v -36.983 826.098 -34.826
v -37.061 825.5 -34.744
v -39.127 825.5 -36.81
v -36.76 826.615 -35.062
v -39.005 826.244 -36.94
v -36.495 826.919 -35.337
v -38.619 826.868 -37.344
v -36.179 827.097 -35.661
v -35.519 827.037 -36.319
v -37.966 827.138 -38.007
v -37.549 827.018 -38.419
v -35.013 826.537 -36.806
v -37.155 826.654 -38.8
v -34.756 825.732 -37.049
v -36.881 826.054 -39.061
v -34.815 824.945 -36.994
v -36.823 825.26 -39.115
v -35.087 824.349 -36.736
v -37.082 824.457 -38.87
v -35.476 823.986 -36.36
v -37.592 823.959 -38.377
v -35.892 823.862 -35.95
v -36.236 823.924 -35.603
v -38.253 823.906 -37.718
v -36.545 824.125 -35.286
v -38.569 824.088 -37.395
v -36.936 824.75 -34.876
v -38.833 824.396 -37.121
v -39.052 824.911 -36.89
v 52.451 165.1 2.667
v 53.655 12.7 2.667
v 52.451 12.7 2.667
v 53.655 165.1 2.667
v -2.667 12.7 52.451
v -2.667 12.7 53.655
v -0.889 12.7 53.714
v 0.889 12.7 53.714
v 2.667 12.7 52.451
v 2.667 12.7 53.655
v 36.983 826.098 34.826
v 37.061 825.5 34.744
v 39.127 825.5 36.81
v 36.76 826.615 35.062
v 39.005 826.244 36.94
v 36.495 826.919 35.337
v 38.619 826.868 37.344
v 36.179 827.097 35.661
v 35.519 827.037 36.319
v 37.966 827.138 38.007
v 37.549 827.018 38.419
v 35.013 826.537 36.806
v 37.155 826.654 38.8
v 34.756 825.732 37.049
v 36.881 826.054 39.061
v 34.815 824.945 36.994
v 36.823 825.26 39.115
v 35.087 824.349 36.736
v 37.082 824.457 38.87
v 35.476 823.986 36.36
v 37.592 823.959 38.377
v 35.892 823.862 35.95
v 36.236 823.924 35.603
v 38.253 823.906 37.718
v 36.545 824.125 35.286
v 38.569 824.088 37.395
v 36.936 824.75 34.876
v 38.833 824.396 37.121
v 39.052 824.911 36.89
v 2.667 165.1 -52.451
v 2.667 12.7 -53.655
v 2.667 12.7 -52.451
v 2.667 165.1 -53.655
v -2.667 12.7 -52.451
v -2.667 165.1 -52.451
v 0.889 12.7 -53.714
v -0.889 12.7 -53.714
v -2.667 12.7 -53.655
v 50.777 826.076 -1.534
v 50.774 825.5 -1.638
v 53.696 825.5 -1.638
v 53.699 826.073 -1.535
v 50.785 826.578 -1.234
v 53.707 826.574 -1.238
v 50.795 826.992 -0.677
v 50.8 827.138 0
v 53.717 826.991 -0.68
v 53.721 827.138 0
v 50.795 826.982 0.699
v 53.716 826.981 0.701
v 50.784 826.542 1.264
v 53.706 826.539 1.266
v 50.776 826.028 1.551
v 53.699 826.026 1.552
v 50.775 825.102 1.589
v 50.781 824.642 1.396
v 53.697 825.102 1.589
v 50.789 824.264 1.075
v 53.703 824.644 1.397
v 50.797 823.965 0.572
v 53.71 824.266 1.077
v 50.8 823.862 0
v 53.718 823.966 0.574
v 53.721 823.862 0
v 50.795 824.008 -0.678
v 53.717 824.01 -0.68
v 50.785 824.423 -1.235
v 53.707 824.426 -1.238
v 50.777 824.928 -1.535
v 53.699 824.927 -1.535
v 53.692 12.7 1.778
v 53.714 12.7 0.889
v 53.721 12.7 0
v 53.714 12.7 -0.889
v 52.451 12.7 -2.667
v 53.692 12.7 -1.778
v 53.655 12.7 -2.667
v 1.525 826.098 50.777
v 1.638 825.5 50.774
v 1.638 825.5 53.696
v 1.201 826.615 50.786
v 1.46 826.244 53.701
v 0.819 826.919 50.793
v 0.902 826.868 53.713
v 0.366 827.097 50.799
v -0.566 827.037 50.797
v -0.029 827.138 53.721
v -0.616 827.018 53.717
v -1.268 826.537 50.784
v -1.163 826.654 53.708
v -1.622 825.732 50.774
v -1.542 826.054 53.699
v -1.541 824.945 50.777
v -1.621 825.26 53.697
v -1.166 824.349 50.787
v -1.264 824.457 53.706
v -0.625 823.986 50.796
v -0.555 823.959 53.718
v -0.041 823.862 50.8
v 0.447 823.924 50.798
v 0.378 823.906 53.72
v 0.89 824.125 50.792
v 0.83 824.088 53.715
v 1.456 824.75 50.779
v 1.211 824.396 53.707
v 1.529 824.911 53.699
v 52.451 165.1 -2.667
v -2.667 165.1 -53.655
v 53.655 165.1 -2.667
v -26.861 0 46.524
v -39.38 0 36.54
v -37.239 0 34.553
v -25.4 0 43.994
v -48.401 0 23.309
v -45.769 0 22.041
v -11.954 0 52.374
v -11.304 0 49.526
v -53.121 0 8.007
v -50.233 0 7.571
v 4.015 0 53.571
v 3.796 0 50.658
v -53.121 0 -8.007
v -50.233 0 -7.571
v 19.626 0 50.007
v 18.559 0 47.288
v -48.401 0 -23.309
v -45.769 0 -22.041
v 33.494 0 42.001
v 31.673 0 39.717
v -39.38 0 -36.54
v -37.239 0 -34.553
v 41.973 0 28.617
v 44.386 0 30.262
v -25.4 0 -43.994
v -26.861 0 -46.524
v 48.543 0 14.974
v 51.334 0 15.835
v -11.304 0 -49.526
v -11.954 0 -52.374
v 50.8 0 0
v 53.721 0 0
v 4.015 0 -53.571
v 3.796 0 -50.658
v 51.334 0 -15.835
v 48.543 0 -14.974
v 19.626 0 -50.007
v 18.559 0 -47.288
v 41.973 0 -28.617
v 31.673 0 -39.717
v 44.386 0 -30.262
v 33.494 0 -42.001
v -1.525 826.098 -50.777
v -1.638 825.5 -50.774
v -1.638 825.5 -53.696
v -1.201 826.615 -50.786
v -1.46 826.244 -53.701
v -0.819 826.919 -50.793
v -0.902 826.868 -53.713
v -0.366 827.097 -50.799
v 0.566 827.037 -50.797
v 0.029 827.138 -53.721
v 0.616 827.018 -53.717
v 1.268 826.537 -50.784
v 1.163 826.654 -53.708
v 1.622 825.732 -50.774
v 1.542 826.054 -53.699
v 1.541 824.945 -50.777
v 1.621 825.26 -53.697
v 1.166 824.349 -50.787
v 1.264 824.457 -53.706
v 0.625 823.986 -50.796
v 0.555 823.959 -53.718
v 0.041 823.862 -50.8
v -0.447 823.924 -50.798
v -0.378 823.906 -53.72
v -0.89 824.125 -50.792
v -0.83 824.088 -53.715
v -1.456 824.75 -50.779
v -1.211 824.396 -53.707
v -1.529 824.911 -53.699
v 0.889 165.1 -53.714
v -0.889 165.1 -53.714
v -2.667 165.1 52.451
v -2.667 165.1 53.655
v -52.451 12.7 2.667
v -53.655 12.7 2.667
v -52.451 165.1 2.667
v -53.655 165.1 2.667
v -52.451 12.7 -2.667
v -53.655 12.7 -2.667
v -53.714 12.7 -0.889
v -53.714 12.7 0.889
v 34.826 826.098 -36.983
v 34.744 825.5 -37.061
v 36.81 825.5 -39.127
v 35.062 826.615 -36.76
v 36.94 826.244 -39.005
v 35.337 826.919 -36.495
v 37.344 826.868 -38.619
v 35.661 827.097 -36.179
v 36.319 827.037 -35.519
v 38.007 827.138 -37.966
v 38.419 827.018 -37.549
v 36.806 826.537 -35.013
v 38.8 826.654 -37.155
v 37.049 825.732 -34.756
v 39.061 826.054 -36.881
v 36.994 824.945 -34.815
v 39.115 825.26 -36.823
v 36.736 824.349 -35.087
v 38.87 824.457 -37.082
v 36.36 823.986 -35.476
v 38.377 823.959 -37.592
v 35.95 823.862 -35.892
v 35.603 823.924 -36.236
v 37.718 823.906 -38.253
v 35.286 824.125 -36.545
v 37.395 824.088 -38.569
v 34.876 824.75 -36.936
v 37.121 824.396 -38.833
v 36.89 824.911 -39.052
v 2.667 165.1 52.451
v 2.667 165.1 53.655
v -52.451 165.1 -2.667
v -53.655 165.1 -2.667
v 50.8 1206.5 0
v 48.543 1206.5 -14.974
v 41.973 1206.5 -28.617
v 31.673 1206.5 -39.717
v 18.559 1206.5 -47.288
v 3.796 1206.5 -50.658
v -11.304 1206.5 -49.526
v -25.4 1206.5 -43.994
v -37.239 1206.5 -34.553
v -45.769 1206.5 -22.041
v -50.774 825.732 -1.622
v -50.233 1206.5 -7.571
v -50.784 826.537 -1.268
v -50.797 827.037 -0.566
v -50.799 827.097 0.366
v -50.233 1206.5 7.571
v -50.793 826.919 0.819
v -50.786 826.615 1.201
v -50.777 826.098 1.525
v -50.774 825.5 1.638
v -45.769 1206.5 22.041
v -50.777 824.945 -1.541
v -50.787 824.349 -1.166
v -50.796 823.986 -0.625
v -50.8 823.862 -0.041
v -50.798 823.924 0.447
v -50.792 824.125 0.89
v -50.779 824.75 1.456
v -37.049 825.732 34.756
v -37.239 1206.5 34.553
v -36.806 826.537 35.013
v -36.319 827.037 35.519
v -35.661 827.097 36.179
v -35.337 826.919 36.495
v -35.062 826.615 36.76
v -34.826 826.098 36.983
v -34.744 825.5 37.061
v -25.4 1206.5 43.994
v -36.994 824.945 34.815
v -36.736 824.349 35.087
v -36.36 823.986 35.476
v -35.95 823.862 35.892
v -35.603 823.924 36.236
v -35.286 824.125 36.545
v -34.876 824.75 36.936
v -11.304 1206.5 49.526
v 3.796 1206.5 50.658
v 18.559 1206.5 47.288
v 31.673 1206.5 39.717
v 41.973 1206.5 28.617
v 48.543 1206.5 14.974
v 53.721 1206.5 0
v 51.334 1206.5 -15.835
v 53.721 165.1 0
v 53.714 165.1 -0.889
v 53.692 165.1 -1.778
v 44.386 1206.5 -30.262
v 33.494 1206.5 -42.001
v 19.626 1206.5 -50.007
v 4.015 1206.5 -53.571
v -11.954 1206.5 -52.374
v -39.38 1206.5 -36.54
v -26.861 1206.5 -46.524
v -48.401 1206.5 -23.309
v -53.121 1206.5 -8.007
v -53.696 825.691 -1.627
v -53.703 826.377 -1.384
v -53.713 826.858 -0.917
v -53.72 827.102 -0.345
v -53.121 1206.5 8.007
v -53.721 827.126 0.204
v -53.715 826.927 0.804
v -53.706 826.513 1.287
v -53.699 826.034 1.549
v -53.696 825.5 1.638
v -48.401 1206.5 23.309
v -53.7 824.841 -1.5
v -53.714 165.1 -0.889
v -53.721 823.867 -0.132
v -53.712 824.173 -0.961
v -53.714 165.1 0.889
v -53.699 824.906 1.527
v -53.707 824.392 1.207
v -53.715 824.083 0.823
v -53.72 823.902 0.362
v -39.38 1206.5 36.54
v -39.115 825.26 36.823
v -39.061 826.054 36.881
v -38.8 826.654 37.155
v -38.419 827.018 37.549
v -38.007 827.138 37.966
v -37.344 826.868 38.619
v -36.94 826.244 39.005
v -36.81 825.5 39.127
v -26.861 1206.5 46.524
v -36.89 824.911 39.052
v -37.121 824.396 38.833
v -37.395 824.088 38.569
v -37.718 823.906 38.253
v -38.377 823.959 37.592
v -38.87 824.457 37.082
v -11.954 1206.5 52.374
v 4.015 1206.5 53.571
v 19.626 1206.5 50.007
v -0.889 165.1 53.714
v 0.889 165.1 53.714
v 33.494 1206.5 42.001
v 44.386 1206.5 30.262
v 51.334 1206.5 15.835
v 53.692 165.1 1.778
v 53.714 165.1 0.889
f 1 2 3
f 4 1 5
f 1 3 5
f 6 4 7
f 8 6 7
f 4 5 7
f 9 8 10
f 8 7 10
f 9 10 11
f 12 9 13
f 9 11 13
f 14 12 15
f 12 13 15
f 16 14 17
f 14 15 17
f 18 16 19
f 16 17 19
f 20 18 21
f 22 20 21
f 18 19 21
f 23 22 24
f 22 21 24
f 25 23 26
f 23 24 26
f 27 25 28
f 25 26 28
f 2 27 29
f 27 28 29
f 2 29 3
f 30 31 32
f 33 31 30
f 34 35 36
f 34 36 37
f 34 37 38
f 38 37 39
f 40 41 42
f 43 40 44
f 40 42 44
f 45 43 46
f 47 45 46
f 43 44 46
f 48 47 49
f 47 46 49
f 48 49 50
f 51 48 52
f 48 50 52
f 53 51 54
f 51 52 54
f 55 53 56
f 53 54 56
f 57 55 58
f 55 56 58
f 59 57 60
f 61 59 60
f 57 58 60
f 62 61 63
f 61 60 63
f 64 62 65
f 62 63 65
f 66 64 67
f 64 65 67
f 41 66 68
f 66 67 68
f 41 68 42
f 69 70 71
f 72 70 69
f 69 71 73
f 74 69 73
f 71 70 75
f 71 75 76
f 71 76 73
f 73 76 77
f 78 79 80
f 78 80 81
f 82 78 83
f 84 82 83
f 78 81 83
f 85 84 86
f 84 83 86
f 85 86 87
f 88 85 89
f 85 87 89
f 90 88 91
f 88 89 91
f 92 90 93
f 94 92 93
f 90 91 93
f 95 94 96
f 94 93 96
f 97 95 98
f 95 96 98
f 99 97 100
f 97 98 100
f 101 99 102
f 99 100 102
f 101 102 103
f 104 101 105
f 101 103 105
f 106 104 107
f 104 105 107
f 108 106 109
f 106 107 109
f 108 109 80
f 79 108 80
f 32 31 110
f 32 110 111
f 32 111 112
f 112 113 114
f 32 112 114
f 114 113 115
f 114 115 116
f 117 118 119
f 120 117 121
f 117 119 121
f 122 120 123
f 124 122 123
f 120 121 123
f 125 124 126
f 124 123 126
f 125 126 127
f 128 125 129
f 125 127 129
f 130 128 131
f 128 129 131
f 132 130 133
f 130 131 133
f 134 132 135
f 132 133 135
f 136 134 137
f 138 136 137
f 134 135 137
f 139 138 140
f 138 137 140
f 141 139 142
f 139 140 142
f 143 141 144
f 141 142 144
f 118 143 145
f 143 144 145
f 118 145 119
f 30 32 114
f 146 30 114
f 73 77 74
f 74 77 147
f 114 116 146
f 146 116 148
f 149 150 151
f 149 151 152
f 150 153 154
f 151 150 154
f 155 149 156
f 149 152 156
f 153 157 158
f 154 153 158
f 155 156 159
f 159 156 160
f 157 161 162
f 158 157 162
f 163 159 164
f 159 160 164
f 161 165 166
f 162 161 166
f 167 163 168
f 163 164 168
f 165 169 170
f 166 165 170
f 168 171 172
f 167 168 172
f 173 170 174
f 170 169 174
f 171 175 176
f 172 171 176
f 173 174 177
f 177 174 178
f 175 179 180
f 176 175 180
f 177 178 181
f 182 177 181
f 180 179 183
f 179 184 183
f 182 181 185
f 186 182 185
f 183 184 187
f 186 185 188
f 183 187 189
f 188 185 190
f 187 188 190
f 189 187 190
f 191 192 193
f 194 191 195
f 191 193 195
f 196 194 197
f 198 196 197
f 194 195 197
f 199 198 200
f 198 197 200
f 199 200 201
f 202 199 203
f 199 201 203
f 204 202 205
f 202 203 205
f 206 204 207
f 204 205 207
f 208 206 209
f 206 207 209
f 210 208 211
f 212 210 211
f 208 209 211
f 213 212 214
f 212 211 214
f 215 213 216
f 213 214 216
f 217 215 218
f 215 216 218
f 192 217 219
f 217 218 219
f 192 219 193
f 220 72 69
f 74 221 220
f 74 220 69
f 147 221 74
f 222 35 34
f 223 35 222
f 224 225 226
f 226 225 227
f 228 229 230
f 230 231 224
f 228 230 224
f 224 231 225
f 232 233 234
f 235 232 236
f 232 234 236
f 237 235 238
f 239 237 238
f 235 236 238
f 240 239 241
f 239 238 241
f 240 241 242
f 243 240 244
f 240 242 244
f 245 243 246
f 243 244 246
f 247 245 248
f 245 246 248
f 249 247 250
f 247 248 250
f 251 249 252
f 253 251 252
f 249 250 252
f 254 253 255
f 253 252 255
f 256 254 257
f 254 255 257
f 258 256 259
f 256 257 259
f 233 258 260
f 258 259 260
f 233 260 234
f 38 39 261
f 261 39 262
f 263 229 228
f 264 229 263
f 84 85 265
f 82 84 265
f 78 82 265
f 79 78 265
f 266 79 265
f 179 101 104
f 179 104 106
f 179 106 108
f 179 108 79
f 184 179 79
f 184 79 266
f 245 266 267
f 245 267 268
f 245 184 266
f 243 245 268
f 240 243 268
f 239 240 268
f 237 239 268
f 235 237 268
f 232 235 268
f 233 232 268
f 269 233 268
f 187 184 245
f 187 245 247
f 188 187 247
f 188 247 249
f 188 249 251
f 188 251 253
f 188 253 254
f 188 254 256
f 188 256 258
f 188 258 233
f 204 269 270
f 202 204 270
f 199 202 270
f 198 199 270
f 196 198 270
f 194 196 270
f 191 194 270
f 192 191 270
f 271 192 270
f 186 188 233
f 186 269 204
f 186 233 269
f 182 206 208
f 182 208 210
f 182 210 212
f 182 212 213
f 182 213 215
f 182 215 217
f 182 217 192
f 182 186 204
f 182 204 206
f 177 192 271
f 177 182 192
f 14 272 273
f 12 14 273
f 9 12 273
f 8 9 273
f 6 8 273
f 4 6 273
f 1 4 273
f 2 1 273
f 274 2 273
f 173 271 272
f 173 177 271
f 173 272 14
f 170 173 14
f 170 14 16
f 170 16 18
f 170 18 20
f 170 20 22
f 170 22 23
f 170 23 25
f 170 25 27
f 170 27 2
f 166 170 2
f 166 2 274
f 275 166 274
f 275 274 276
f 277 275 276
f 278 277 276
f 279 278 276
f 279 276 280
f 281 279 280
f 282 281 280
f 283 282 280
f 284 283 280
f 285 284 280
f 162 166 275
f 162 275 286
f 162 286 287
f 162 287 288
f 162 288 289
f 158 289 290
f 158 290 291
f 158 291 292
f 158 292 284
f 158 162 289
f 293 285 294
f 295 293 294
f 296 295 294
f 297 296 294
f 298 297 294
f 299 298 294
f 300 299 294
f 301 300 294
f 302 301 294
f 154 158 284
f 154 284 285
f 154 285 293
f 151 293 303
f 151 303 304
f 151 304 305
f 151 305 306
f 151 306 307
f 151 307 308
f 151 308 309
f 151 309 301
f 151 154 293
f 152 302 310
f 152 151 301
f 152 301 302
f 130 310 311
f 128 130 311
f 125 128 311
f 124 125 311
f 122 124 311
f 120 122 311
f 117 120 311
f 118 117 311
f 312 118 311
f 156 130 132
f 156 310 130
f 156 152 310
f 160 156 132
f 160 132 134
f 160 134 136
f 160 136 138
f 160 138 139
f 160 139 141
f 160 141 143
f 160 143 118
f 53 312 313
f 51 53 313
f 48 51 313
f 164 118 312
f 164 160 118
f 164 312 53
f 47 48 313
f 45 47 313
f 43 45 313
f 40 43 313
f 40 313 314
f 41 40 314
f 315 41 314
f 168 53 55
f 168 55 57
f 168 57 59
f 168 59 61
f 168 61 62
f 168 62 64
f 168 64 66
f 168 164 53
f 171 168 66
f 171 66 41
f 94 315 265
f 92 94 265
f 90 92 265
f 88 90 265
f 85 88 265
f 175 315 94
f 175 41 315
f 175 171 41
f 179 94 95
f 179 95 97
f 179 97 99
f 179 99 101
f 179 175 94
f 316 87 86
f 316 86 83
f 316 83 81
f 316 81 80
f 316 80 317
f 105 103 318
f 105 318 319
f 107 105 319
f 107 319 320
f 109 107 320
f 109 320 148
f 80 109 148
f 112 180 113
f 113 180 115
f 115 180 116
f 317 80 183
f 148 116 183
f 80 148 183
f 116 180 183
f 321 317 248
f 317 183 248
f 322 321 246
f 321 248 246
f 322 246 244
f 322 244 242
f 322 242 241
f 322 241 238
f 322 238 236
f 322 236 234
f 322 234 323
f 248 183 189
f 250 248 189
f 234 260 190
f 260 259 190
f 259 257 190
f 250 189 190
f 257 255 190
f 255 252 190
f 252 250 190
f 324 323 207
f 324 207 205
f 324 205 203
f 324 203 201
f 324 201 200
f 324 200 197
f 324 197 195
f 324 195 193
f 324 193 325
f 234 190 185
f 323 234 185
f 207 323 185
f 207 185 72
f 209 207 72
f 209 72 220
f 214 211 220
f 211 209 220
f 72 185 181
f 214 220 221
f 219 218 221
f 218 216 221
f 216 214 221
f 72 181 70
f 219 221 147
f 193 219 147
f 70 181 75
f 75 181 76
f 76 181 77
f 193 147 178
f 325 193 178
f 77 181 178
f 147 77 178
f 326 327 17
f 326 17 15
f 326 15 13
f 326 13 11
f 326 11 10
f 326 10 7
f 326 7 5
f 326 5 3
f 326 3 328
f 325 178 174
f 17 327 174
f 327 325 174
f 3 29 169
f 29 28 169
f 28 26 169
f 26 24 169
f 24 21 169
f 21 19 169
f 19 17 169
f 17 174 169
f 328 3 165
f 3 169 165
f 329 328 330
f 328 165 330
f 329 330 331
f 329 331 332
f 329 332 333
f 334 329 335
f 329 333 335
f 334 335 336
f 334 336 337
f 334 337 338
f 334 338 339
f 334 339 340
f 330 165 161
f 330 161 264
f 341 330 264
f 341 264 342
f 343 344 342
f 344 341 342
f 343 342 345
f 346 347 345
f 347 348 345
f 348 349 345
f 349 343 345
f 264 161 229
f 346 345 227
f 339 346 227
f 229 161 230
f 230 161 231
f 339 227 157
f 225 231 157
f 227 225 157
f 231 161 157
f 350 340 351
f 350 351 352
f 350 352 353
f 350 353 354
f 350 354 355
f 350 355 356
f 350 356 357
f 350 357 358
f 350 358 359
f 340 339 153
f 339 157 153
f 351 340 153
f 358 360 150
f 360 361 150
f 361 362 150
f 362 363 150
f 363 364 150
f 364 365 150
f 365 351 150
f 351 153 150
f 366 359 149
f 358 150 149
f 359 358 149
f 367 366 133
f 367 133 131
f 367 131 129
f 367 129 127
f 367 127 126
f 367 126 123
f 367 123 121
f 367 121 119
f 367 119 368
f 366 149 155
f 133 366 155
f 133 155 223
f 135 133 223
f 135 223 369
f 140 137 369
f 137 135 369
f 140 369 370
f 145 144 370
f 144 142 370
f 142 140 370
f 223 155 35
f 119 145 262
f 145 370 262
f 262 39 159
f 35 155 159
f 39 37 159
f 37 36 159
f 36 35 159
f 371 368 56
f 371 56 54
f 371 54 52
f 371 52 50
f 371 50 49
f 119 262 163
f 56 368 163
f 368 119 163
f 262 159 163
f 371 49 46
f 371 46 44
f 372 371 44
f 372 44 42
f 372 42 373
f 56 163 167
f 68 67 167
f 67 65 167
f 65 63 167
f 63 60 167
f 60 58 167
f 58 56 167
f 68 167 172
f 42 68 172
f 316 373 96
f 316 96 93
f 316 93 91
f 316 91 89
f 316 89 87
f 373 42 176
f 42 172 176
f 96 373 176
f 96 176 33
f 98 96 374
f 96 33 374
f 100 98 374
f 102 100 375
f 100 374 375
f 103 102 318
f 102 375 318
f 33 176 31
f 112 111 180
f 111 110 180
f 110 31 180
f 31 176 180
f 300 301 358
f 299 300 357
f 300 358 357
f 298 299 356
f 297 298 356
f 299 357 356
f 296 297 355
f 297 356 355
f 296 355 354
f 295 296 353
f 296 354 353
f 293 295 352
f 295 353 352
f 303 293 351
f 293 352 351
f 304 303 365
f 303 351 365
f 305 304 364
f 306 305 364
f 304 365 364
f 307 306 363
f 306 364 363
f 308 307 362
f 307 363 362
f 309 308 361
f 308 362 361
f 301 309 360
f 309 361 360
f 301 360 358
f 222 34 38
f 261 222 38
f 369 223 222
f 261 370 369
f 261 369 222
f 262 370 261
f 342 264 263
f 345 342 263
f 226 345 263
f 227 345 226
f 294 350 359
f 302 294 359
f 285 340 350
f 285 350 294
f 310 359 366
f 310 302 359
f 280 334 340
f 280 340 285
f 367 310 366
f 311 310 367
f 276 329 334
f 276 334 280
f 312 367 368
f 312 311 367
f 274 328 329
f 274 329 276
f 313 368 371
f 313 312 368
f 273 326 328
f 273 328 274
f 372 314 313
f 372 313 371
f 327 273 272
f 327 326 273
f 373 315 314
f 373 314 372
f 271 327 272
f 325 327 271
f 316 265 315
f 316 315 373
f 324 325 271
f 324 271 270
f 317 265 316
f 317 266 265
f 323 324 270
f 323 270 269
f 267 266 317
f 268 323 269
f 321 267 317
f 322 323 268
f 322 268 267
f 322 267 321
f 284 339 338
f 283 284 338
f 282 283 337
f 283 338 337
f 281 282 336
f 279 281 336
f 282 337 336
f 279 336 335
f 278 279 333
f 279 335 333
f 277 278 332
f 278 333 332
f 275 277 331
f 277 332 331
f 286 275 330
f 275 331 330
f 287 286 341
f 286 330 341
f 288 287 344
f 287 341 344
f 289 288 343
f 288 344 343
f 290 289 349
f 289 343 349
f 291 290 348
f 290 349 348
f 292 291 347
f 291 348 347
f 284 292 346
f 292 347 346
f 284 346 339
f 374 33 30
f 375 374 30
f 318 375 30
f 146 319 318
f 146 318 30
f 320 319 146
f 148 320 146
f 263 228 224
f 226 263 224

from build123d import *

# Parameters (mm, degrees)
SKETCH1_R                 = 53.721
SKETCH1_R_2               = 50.8
BODY_TUBE_EXTRUSION_DEPTH = 1206.5
BULKHEAD_HOLE_REACH       = 1214.465
BULKHEAD_HOLE_END_RADIUS  = 50.8
SKETCH2_R                 = 1.6383
CIRPATTERN1_COUNT         = 8
SKETCH3_W                 = 5.334
SKETCH3_H                 = 152.4
CUT_EXTRUDE1_DEPTH        = 1.27
CIRPATTERN2_COUNT         = 4


with BuildPart() as part:
    # Sketch1 → Body Tube Extrusion (new body)
    with BuildSketch(Plane(origin=(0, 0, 0), x_dir=(1, 0, 0), z_dir=(0, 1, 0))):
        Circle(SKETCH1_R)
        Circle(SKETCH1_R_2, mode=Mode.SUBTRACT)
    extrude(amount=BODY_TUBE_EXTRUSION_DEPTH)

    # Bulkhead Hole: up to this cylinder (the profile starts outside it)
    bulkhead_hole_end = Plane(origin=(0, 825.5, 0), z_dir=(0, -1, 0)) * Cylinder(BULKHEAD_HOLE_END_RADIUS, 2531.53, mode=Mode.PRIVATE)
    # Sketch2 → Bulkhead Hole (cut, up to the surface)
    with BuildSketch(Plane.XY.offset(53.721), mode=Mode.PRIVATE) as bulkhead_hole_sk1:
        with Locations((0, 825.5)):
            Circle(SKETCH2_R)
    bulkhead_hole_tool1 = extrude(bulkhead_hole_sk1.sketch, amount=-BULKHEAD_HOLE_REACH, mode=Mode.PRIVATE) - bulkhead_hole_end
    bulkhead_hole = bulkhead_hole_tool1.solids().sort_by_distance((0, 825.5, 53.721))[0]
    add(bulkhead_hole, mode=Mode.SUBTRACT)

    # CirPattern1: Bulkhead Hole ×8 about axis
    cirpattern1_axis = Axis((0, 1206.5, 0), (0, -1, 0))
    for i in range(1, CIRPATTERN1_COUNT):
        add(bulkhead_hole.rotate(cirpattern1_axis, i * 360 / CIRPATTERN1_COUNT), mode=Mode.SUBTRACT)

    # Sketch3 → Cut-Extrude1 (cut)
    with BuildSketch(Plane.XY.offset(53.721)):
        with Locations((0, 88.9)):
            Rectangle(SKETCH3_W, SKETCH3_H)
    cut_extrude1 = extrude(amount=-CUT_EXTRUDE1_DEPTH, mode=Mode.SUBTRACT)

    # CirPattern2: Cut-Extrude1 ×4 about axis
    cirpattern2_axis = Axis((0, 0, 0), (0, 1, 0))
    for i in range(1, CIRPATTERN2_COUNT):
        add(cut_extrude1.rotate(cirpattern2_axis, i * 360 / CIRPATTERN2_COUNT), mode=Mode.SUBTRACT)


solid = part.part
